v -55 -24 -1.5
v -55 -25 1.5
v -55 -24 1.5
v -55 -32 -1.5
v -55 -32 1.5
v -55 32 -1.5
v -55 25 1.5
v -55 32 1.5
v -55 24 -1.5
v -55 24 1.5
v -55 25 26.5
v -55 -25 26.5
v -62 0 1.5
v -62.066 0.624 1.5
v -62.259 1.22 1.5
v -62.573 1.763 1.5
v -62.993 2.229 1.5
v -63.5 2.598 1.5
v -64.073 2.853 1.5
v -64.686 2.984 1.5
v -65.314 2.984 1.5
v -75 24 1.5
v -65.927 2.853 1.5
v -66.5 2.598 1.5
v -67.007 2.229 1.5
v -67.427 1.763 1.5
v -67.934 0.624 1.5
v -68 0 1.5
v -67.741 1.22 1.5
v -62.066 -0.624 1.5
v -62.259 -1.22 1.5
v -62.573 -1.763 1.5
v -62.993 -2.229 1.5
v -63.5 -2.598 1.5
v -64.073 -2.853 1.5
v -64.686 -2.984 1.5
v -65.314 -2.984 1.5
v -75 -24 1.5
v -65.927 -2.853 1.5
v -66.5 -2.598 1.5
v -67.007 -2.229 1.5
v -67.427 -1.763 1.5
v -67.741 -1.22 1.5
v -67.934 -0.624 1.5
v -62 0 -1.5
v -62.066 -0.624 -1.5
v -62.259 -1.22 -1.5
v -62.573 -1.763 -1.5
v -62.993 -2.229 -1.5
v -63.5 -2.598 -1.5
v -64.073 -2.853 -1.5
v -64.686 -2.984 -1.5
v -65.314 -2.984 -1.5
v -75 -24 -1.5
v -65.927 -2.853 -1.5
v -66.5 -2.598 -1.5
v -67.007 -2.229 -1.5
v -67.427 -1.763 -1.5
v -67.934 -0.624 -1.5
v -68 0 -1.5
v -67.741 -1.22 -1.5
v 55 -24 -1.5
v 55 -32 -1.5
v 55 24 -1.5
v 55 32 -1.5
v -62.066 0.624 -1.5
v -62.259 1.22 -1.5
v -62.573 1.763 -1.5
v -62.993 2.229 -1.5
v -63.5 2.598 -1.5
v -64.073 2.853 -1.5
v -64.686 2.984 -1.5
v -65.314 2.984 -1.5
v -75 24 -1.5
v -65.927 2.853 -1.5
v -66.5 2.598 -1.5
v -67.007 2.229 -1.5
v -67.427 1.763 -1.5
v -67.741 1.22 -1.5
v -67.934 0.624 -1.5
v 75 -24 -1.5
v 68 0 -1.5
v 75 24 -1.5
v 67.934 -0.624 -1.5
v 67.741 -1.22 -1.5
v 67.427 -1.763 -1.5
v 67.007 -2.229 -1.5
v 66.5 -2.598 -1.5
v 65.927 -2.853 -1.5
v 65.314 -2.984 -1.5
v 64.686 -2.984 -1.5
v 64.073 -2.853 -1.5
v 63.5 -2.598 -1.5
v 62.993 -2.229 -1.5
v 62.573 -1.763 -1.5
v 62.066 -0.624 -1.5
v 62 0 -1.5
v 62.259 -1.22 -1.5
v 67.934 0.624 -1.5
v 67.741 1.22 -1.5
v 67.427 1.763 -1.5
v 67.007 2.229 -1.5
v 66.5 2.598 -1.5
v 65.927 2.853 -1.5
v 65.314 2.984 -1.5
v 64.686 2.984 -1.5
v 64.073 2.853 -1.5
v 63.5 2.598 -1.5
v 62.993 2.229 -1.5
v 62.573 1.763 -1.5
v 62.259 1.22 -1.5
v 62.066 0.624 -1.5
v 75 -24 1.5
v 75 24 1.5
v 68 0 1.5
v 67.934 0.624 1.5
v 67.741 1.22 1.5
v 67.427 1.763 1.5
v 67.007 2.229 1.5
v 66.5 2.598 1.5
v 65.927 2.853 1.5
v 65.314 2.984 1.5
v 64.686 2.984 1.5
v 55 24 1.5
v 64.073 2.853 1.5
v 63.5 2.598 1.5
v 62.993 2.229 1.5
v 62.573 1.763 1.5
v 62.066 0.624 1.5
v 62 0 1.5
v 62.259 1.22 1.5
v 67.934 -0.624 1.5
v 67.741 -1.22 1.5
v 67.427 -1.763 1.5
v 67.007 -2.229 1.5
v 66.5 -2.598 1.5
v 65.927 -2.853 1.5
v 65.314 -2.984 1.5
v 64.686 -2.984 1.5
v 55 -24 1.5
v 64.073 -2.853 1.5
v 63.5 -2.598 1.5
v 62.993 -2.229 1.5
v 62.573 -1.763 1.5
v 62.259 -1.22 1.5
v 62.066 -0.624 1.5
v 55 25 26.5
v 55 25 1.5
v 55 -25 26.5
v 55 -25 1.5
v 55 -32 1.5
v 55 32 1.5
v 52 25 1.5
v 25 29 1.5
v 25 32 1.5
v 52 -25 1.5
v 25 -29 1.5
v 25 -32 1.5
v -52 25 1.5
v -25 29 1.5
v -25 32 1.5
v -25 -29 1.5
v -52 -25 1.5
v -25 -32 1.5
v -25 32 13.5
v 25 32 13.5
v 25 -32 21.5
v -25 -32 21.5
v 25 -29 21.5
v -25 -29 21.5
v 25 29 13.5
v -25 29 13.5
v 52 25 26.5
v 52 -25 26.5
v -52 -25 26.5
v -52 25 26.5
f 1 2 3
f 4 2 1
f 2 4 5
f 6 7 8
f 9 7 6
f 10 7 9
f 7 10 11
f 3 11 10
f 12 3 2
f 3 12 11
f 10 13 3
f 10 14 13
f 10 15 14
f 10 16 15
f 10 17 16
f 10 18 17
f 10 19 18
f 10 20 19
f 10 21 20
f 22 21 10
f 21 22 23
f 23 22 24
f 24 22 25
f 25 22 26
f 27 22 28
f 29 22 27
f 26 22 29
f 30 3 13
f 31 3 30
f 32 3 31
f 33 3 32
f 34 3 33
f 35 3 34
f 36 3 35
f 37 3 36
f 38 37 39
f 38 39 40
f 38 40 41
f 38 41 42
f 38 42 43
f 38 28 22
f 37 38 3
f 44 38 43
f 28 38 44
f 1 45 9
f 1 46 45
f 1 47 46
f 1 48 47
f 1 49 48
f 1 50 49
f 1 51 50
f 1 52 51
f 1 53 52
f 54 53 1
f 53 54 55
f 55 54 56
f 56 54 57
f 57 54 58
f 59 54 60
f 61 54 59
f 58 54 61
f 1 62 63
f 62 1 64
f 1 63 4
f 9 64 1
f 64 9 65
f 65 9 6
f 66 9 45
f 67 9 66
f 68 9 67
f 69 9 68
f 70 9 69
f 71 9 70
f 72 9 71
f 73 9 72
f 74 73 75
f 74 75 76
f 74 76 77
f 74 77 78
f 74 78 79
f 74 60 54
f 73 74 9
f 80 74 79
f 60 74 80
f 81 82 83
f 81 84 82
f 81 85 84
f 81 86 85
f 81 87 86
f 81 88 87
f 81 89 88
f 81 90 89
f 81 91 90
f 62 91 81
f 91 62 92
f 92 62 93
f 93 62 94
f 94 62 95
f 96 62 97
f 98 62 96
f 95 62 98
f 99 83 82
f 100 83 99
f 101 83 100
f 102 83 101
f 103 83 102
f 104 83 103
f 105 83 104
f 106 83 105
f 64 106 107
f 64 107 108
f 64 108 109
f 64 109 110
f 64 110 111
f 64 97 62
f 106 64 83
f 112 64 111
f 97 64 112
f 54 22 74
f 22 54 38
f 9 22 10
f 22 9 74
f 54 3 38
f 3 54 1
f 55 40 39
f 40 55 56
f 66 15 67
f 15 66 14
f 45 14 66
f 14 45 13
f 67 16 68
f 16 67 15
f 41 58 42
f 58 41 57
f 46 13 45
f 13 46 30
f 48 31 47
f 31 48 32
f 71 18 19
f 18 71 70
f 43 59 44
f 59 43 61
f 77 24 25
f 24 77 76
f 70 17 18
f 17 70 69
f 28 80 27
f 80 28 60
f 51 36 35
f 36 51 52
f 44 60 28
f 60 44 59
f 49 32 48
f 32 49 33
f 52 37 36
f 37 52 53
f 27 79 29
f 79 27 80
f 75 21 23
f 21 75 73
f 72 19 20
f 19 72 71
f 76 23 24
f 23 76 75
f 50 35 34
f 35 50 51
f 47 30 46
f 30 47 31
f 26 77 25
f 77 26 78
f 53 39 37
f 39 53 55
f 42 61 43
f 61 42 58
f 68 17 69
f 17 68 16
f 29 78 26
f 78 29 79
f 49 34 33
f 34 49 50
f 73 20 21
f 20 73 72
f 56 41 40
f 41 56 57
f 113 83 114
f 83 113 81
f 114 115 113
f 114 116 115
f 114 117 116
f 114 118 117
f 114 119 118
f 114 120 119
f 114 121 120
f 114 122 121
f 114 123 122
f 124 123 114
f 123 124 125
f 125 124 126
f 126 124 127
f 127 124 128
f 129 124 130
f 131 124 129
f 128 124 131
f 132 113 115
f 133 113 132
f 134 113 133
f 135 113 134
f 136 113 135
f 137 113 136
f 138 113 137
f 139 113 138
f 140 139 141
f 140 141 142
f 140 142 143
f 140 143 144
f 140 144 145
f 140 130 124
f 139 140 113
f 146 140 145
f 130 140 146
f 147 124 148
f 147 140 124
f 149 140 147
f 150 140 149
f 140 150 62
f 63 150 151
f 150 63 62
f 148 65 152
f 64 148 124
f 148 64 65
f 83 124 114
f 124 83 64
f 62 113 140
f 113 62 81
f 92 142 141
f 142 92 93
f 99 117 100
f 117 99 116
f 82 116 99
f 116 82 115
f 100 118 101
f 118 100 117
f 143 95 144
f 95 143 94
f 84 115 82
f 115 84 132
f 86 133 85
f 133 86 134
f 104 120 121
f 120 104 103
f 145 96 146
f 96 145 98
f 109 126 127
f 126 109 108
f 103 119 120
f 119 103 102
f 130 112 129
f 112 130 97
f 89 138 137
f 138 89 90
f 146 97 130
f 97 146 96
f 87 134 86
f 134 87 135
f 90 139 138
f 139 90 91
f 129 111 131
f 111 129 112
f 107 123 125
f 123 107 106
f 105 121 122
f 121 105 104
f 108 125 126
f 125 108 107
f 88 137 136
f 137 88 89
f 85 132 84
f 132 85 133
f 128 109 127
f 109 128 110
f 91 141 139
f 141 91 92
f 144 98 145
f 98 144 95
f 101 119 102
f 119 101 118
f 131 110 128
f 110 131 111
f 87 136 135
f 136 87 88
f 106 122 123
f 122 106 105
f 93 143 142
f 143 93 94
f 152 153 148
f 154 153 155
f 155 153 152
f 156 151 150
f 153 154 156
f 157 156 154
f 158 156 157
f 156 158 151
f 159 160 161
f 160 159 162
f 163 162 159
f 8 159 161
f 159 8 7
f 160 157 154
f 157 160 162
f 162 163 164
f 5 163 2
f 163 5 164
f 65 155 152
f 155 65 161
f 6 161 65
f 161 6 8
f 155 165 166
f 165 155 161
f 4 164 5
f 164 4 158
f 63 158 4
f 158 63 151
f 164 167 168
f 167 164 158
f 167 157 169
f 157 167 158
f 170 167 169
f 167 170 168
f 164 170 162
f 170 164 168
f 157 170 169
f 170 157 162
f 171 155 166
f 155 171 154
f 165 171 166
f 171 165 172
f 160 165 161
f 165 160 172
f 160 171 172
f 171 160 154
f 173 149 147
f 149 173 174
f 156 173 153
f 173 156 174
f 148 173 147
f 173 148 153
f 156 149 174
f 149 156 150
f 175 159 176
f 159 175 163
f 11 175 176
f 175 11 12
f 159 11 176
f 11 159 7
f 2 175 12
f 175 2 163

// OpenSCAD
// file: pyle_pha40_constants.scad
mount_wing_x = 20;
mount_wing_y = 48;
screw_hole_r = 3;

front_rear_wall_x = 50;
front_rear_wall_y = 3;
front_wall_z = 20;
rear_wall_z = 12;

side_wall_x = 3;
side_wall_y = 50;
side_wall_z = 25;

base_z = 3;

main_base_x = 104 + side_wall_x * 2;
main_base_y = 58 + front_rear_wall_y * 2;

red = [1, 0, 0];
green = [0, 1, 0];
blue = [0, 0, 1];
// main file
include <pyle_pha40_constants.scad>;

// High resolution cylinders
$fs = .01;

// main base
color(green)
    cube([main_base_x, main_base_y, base_z], true);

// left mounting wing
translate([(-main_base_x/2 + -mount_wing_x/2),
    (main_base_y/2 - mount_wing_y/2 - ((main_base_y - mount_wing_y) /2)),
    0]) {
    color(red)
        difference() {
        cube([mount_wing_x, mount_wing_y, base_z], true, .6, "zmax");
        translate([0, 0, -base_z/2-.1])
            cylinder(base_z + .2, r = screw_hole_r, true);
        }
    }   

// right mounting wing
translate([(main_base_x/2 + mount_wing_x/2),
    (main_base_y/2 - mount_wing_y/2 - ((main_base_y - mount_wing_y) /2)),
    0]) {
    color(blue)
        difference() {
        cube([mount_wing_x, mount_wing_y, base_z], true, .6, "x");
        translate([0, 0, -base_z/2-.1])
            cylinder(base_z + .2, r = screw_hole_r, true);
        }
    }

// front wall
translate([0, -main_base_y/2 + front_rear_wall_y / 2, front_wall_z / 2 + base_z / 2])
    cube([front_rear_wall_x, front_rear_wall_y, front_wall_z], true);

// rear wall
translate([0, main_base_y/2 - front_rear_wall_y / 2, rear_wall_z / 2 + base_z / 2])
    cube([front_rear_wall_x, front_rear_wall_y, rear_wall_z], true);

// left wall
translate([main_base_x/2 - side_wall_x / 2, 0, side_wall_z / 2 + base_z / 2])
    cube([side_wall_x, side_wall_y, side_wall_z], true);

// right wall
translate([-main_base_x/2 + side_wall_x / 2, 0, side_wall_z / 2 + base_z / 2])
    cube([side_wall_x, side_wall_y, side_wall_z], true);
